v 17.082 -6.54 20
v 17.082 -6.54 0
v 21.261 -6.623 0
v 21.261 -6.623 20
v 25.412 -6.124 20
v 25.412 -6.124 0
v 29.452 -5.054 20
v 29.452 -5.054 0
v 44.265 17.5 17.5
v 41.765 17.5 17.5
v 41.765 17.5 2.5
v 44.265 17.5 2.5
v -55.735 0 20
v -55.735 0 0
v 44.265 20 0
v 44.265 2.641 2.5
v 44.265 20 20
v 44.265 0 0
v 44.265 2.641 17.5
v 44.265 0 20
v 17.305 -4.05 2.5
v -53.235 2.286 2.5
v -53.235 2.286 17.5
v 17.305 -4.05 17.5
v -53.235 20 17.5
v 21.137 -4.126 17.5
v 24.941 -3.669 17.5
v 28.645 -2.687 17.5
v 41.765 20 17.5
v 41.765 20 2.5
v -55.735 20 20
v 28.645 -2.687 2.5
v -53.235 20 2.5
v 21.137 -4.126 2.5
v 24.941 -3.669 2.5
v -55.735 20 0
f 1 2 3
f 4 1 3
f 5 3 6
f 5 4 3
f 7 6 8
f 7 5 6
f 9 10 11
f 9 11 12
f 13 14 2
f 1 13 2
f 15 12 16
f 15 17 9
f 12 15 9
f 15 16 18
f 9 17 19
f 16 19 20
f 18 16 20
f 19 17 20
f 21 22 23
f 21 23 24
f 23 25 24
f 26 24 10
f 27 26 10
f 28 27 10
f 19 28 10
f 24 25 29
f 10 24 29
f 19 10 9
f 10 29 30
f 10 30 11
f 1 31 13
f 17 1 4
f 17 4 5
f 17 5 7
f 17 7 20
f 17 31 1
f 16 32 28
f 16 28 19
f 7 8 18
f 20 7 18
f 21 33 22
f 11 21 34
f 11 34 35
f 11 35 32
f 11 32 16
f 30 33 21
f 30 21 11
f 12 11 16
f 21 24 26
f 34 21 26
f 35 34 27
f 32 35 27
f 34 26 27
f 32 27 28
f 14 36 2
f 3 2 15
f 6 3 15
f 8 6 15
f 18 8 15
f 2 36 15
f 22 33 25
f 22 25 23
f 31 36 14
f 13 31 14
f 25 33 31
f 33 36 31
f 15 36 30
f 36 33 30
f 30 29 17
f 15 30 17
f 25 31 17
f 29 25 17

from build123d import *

# Parameters (mm, degrees)
F1_DEPTH = 20
F2_R     = 30
F3_T     = -2.5
F4_W     = 2.5
F4_H     = 2.5
F5_DEPTH = 15


with BuildPart() as f1:
    # F0 (on Top) → F1 (new body)
    with BuildSketch(Plane.XY):
        Polygon((44.264942, 20), (-55.735058, 20), (-55.735058, 0), (23.424878, -7.109921), (44.264942, 0), align=None)
    extrude(amount=F1_DEPTH)

    # F2
    f2_edges = [f1.edges().sort_by_distance(p)[0] for p in [
        (23.424878, -7.109921, 10),
    ]]
    fillet(f2_edges, radius=F2_R)

    # F3
    f3_openings = [f1.faces().sort_by_distance(p)[0] for p in [
        (44.264942, 10, 10),
        (-5.735058, 20, 10),
    ]]
    offset(amount=F3_T, openings=f3_openings)

    # F4 (on face) → F5 (join)
    with BuildSketch(Plane(origin=(0, 0, 17.5), x_dir=(1, 0, 0), z_dir=(0, 0, -1))):
        with Locations((43.014942, -18.75)):
            Rectangle(F4_W, F4_H)
    extrude(amount=F5_DEPTH)


solid = f1.part
